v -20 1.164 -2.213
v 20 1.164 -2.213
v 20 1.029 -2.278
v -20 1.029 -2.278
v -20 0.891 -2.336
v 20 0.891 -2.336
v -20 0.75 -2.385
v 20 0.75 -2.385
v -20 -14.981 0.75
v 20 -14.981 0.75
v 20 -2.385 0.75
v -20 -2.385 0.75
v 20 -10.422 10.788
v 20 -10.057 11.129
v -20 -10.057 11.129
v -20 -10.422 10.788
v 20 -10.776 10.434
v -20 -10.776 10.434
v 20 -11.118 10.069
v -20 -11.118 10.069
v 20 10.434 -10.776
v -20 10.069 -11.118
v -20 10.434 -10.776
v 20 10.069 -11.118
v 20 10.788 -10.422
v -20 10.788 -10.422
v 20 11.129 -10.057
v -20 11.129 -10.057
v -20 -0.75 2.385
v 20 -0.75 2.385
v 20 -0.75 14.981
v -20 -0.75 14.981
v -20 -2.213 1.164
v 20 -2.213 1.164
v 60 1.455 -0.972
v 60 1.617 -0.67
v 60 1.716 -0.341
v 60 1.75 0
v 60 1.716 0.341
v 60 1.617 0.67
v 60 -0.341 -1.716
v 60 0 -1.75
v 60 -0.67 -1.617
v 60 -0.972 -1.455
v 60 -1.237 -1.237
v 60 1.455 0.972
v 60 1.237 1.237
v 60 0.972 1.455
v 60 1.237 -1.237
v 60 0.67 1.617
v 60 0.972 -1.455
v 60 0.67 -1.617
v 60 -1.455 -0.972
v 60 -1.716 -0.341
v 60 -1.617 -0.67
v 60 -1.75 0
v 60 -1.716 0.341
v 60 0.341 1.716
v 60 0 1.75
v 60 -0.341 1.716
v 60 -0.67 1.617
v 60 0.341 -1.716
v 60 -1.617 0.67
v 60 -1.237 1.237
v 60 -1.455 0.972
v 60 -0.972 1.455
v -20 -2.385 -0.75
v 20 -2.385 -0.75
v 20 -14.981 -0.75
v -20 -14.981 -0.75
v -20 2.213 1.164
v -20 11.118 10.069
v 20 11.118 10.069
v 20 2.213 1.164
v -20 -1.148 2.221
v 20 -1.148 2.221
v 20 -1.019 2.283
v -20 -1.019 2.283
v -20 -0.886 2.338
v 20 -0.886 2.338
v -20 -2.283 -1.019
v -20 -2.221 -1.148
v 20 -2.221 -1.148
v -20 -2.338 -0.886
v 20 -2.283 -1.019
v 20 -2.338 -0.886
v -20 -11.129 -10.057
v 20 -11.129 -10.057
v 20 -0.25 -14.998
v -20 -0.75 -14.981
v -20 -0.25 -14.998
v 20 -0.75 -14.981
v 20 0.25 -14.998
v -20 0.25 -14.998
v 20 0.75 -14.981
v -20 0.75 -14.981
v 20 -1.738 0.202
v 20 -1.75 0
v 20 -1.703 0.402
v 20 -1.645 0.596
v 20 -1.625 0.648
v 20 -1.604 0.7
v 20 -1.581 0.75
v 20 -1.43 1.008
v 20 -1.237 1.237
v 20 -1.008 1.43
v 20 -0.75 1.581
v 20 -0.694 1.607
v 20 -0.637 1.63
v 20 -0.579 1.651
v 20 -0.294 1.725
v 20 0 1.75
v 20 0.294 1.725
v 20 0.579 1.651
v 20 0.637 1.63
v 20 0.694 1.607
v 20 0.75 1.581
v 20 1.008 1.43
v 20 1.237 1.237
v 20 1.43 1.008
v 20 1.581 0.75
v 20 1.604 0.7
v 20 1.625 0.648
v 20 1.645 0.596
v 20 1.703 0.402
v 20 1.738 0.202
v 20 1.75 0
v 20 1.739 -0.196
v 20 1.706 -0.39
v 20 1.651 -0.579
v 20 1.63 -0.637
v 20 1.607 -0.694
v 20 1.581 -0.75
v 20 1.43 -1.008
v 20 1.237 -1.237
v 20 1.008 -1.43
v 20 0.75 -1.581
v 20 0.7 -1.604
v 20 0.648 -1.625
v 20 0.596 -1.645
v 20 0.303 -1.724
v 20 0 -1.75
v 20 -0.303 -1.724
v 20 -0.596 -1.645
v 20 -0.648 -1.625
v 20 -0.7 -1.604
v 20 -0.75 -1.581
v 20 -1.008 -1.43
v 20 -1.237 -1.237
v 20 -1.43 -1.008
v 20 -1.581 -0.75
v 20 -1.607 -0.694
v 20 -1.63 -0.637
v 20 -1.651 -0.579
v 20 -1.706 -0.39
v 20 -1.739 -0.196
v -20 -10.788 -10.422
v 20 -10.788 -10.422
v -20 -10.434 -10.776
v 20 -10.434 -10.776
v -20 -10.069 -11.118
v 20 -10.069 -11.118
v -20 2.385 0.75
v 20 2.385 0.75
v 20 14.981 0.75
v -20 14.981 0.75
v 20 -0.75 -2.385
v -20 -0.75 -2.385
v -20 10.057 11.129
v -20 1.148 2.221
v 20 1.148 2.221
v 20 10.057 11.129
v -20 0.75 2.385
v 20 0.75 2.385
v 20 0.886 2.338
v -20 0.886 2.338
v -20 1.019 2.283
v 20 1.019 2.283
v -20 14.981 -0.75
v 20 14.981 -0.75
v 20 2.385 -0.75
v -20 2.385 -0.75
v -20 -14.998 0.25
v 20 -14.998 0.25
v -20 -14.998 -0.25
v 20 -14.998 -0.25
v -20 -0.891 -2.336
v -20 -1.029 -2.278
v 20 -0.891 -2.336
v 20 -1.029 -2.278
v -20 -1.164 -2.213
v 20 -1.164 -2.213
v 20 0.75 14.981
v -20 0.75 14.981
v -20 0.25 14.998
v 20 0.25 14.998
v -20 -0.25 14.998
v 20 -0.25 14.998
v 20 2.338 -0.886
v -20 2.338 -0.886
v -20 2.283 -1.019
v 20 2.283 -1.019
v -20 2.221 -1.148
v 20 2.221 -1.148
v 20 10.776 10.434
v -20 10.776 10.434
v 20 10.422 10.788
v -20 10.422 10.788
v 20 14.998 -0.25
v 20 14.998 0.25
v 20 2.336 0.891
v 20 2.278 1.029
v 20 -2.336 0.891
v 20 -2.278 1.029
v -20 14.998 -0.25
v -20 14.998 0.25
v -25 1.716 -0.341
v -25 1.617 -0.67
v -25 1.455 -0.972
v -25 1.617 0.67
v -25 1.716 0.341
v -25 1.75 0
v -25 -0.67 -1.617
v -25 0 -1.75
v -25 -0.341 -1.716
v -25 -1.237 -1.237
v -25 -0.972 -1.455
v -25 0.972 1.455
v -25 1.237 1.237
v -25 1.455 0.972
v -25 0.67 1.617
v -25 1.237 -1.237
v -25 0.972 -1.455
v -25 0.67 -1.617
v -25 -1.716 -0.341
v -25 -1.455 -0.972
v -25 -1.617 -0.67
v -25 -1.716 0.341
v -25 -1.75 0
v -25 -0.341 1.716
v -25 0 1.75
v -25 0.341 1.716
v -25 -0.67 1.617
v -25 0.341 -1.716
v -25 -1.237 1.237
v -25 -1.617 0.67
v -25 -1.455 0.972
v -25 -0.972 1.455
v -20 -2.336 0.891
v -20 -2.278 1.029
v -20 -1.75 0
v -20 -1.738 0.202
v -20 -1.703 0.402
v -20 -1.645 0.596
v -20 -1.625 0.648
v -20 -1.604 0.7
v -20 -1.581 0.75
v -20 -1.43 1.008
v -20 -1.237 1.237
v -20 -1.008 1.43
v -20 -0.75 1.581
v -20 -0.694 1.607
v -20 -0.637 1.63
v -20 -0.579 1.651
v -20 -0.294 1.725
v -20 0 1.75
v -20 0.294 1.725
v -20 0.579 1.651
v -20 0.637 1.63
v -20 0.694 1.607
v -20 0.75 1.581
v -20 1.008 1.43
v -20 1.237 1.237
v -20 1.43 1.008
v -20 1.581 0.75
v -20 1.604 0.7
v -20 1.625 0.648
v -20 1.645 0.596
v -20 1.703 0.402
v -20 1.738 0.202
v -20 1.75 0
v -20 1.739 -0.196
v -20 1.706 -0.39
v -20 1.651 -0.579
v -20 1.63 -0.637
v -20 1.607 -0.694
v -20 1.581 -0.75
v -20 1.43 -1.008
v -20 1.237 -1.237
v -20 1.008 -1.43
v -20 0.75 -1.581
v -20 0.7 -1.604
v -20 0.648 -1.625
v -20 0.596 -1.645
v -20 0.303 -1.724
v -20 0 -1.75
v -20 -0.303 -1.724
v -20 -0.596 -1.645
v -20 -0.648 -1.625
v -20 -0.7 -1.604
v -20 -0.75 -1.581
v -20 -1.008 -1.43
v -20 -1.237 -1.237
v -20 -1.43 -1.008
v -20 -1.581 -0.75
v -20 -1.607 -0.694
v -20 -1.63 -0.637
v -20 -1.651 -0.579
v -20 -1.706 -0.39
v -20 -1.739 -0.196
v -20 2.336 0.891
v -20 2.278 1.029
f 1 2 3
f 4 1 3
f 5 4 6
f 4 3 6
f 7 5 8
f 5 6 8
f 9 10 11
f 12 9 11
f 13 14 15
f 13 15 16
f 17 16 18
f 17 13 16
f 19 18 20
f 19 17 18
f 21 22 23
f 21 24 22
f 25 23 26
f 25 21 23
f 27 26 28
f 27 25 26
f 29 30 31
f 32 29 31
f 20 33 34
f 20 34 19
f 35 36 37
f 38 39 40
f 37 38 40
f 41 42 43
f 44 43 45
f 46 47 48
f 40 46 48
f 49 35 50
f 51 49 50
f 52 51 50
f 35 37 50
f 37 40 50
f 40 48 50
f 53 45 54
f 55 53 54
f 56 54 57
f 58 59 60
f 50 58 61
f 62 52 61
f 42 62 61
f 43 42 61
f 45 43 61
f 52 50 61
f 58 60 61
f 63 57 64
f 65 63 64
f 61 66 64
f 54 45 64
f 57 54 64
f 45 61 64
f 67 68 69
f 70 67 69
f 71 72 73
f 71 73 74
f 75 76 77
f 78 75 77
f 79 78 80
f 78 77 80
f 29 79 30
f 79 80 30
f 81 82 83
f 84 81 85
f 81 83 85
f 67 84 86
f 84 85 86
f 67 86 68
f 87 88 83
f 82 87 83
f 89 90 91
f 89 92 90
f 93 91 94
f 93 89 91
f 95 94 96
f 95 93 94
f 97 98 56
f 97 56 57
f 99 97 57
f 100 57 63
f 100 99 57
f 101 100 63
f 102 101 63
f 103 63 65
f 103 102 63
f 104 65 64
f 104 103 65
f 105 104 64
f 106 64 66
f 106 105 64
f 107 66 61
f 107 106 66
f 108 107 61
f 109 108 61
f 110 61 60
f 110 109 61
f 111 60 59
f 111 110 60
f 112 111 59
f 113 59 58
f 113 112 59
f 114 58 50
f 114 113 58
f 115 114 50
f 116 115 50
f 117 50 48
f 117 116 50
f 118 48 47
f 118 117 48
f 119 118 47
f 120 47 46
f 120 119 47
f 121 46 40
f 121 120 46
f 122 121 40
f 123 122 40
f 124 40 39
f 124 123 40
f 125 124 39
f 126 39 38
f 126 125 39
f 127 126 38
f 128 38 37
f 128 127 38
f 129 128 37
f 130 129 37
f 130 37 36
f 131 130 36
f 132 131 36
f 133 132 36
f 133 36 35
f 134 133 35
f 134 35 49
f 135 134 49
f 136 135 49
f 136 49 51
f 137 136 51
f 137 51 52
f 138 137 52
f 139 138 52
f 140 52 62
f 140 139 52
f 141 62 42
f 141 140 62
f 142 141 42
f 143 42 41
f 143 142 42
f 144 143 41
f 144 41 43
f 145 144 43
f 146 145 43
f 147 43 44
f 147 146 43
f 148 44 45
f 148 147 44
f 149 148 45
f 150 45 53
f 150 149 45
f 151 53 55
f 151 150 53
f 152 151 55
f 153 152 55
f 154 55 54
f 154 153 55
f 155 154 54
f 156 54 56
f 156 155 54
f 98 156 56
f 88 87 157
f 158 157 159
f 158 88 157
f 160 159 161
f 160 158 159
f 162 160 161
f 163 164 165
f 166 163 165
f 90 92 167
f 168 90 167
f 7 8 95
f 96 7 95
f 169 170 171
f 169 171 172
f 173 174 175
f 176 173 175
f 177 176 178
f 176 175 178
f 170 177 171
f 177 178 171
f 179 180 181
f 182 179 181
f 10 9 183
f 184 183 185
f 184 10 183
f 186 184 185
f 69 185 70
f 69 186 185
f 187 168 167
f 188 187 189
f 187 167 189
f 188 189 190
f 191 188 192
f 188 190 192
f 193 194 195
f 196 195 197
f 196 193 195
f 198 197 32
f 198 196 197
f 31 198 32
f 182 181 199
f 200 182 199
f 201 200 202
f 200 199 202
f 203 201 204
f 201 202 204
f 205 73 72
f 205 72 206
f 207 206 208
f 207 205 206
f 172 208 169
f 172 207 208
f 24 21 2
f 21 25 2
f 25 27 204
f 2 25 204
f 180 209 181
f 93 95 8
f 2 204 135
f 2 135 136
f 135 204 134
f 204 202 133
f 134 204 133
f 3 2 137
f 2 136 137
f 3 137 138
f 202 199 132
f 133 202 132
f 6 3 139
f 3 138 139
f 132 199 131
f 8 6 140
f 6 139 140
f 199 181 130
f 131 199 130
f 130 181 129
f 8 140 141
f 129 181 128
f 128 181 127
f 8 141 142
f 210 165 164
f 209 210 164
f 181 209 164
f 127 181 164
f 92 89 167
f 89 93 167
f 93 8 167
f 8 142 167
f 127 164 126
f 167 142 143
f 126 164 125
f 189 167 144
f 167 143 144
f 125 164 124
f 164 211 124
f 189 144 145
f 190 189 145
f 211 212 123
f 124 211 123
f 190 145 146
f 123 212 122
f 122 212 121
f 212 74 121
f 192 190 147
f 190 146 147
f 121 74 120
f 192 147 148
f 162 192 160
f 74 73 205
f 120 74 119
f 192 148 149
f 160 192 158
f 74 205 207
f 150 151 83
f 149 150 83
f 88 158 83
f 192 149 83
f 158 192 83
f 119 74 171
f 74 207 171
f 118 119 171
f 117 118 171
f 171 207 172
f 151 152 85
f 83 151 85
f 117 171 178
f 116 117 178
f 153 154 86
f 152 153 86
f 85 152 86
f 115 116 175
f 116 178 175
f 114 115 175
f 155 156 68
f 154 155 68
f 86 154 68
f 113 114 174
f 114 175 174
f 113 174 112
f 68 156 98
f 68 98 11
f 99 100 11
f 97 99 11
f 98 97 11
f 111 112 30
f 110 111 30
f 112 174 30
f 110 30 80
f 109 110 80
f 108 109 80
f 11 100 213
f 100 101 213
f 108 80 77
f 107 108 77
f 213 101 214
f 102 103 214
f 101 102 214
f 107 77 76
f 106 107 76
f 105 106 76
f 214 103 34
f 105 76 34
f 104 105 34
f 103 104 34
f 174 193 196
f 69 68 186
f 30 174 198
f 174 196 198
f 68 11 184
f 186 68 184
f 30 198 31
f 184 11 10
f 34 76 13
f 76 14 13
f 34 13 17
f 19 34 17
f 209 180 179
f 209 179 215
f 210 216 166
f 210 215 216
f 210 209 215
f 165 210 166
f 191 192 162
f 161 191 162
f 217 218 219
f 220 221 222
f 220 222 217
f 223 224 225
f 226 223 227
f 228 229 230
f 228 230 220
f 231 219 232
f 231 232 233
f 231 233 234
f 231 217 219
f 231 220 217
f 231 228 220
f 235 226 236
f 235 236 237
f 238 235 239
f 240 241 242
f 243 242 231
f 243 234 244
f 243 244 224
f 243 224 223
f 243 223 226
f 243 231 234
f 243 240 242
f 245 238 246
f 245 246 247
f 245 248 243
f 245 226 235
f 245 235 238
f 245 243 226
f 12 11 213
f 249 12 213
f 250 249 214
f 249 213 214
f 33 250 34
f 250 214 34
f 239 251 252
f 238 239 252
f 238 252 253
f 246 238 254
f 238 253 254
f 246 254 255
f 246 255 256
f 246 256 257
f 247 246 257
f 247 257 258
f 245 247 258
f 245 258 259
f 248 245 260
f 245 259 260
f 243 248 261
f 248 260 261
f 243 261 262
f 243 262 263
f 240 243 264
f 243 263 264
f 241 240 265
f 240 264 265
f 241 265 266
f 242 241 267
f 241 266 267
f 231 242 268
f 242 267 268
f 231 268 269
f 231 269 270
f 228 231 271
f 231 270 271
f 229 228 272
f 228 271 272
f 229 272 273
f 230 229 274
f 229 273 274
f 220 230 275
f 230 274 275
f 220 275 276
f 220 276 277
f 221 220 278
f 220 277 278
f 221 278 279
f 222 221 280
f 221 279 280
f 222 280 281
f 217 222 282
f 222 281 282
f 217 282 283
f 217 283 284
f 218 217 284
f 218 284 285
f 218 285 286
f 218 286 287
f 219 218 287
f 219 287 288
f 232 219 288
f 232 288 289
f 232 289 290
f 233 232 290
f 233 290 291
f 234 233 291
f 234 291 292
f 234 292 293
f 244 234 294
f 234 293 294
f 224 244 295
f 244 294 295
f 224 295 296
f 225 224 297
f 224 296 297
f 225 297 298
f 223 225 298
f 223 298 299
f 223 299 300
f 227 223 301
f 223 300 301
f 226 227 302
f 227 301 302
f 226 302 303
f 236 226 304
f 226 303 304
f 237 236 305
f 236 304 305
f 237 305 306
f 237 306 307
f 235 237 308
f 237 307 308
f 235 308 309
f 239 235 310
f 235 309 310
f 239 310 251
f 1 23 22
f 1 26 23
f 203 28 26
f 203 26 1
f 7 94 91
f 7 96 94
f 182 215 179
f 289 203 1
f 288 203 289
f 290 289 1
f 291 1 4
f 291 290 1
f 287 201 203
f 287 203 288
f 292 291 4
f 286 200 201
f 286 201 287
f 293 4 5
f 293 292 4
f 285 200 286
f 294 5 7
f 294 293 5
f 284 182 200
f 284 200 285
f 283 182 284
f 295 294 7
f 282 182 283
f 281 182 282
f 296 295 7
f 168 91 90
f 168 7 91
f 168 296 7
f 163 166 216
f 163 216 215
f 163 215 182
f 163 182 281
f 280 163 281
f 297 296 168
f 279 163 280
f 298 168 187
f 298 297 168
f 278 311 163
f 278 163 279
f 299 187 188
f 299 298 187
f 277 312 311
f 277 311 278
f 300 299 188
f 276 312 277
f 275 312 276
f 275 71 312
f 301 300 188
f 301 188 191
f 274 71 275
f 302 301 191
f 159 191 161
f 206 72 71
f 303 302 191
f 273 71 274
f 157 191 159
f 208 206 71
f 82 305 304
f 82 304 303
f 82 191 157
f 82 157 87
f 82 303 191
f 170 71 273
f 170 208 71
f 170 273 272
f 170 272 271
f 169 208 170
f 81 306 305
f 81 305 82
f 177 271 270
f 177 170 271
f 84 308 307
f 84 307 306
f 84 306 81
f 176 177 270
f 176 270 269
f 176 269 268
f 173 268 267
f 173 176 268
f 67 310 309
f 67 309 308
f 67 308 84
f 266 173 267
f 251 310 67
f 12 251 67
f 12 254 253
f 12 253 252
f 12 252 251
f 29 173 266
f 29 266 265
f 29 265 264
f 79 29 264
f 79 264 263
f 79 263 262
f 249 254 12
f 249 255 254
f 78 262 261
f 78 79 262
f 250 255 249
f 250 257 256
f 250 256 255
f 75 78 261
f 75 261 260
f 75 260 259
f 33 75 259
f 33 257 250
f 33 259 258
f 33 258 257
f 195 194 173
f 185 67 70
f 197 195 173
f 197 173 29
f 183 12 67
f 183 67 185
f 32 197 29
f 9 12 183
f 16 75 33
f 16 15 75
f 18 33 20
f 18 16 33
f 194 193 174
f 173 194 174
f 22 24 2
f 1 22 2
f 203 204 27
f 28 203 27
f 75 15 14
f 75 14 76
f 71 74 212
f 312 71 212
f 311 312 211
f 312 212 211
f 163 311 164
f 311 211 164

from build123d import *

# Parameters (mm, degrees)
F0_W          = 40
F0_H          = 15
F3_DEPTH      = 40.001
F4_R          = 1.75
F4_R_2        = 0.75
F6_DEPTH      = 5
F6_DEPTH_BACK = 80


with BuildPart() as f1:
    # F0 (on Top) → F1 (revolve)
    with BuildSketch(Plane.XY):
        with Locations((0, 7.5)):
            Rectangle(F0_W, F0_H)
    revolve(axis=Axis((0, 0, 0), (1, 0, 0)))

    # F2 (on face) → F3 (cut, through all)
    with BuildSketch(Plane.YZ.offset(20)):
        with BuildLine():
            ThreePointArc((1.651475323, -0.578903496), (1.7251930059, -0.2936138491), (1.75, 0))
            ThreePointArc((1.75, 0), (1.7236043316, 0.3028004429), (1.6452135906, 0.5964664628))
            ThreePointArc((1.6452135906, 0.5964664628), (1.6150017407, 0.6739950872), (1.5811388301, 0.75))
            ThreePointArc((1.5811388301, 0.75), (1.2374368671, 1.2374368671), (0.75, 1.5811388301))
            ThreePointArc((0.75, 1.5811388301), (0.6653812907, 1.618569658), (0.5789024703, 1.6514756825))
            ThreePointArc((0.5789024703, 1.6514756825), (0, 1.75), (-0.5789024703, 1.6514756825))
            ThreePointArc((-0.5789024703, 1.6514756825), (-0.6653812907, 1.618569658), (-0.75, 1.5811388301))
            ThreePointArc((-0.75, 1.5811388301), (-1.2374368671, 1.2374368671), (-1.5811388301, 0.75))
            ThreePointArc((-1.5811388301, 0.75), (-1.6150017407, 0.6739950872), (-1.6452135906, 0.5964664628))
            ThreePointArc((-1.6452135906, 0.5964664628), (-1.7499751665, 0.0093229166), (-1.651475323, -0.578903496))
            ThreePointArc((-1.651475323, -0.578903496), (-1.6185694514, -0.6653817934), (-1.5811388301, -0.75))
            ThreePointArc((-1.5811388301, -0.75), (-1.2374368671, -1.2374368671), (-0.75, -1.5811388301))
            ThreePointArc((-0.75, -1.5811388301), (-0.6739945857, -1.61500195), (-0.596465441, -1.6452139611))
            ThreePointArc((-0.596465441, -1.6452139611), (0, -1.75), (0.596465441, -1.6452139611))
            ThreePointArc((0.596465441, -1.6452139611), (0.6739945857, -1.61500195), (0.75, -1.5811388301))
            ThreePointArc((0.75, -1.5811388301), (1.2374368671, -1.2374368671), (1.5811388301, -0.75))
            ThreePointArc((1.5811388301, -0.75), (1.6185694514, -0.6653817934), (1.651475323, -0.578903496))
        make_face()
        with BuildLine():
            ThreePointArc((2.2125773299, 1.1638305544), (2.3080064679, 0.9607841298), (2.3848480035, 0.75))
            Line((2.3848480035, 0.75), (14.9812382666, 0.75))
            ThreePointArc((14.9812382666, 0.75), (13.8565778233, 5.7441492866), (11.118002457, 10.0692612126))
            Line((11.118002457, 10.0692612126), (2.2125773299, 1.1638305544))
        make_face()
        with BuildLine():
            ThreePointArc((2.3848480035, -0.75), (2.3113855708, -0.9526262348), (2.2207433968, -1.1481719234))
            Line((2.2207433968, -1.1481719234), (11.1293184453, -10.0567525048))
            ThreePointArc((11.1293184453, -10.0567525048), (13.8598053196, -5.7363574246), (14.9812382666, -0.75))
            Line((14.9812382666, -0.75), (2.3848480035, -0.75))
        make_face()
        with BuildLine():
            Line((10.0692543074, -11.1180087108), (1.1638291802, -2.2125780527))
            ThreePointArc((1.1638291802, -2.2125780527), (0.960783413, -2.3080067663), (0.75, -2.3848480035))
            Line((0.75, -2.3848480035), (0.75, -14.9812382666))
            ThreePointArc((0.75, -14.9812382666), (5.7441449835, -13.8565796071), (10.0692543074, -11.1180087108))
        make_face()
        with BuildLine():
            Line((-0.75, -14.9812382666), (-0.75, -2.3848480035))
            ThreePointArc((-0.75, -2.3848480035), (-0.960783413, -2.3080067663), (-1.1638291802, -2.2125780527))
            Line((-1.1638291802, -2.2125780527), (-10.0692543074, -11.1180087108))
            ThreePointArc((-10.0692543074, -11.1180087108), (-5.7441449835, -13.8565796071), (-0.75, -14.9812382666))
        make_face()
        with BuildLine():
            Line((-11.1293184453, -10.0567525048), (-2.2207433968, -1.1481719234))
            ThreePointArc((-2.2207433968, -1.1481719234), (-2.3113855708, -0.9526262348), (-2.3848480035, -0.75))
            Line((-2.3848480035, -0.75), (-14.9812382666, -0.75))
            ThreePointArc((-14.9812382666, -0.75), (-13.8598053196, -5.7363574246), (-11.1293184453, -10.0567525048))
        make_face()
        with BuildLine():
            ThreePointArc((-2.3848480035, 0.75), (-2.3080064679, 0.9607841298), (-2.2125773299, 1.1638305544))
            Line((-2.2125773299, 1.1638305544), (-11.118002457, 10.0692612126))
            ThreePointArc((-11.118002457, 10.0692612126), (-13.8565778233, 5.7441492866), (-14.9812382666, 0.75))
            Line((-14.9812382666, 0.75), (-2.3848480035, 0.75))
        make_face()
        with BuildLine():
            ThreePointArc((-1.1481705441, 2.2207441099), (-0.952625517, 2.3113858666), (-0.75, 2.3848480035))
            Line((-0.75, 2.3848480035), (-0.75, 14.9812382666))
            ThreePointArc((-0.75, 14.9812382666), (-5.7363531205, 13.859807101), (-10.0567455926, 11.1293246914))
            Line((-10.0567455926, 11.1293246914), (-1.1481705441, 2.2207441099))
        make_face()
        with BuildLine():
            ThreePointArc((0.75, 2.3848480035), (0.952625517, 2.3113858666), (1.1481705441, 2.2207441099))
            Line((1.1481705441, 2.2207441099), (10.0567455926, 11.1293246914))
            ThreePointArc((10.0567455926, 11.1293246914), (5.7363531205, 13.859807101), (0.75, 14.9812382666))
            Line((0.75, 14.9812382666), (0.75, 2.3848480035))
        make_face()
    extrude(amount=-F3_DEPTH, mode=Mode.SUBTRACT)

    # F4 (on face) → F6 (join, two sides)
    with BuildSketch(Plane(origin=(-20, 0, 0), x_dir=(0, -1, 0), z_dir=(-1, 0, 0))) as f6_sk:
        Circle(F4_R)
        Circle(F4_R_2, mode=Mode.SUBTRACT)
        Circle(F4_R_2)
    extrude(amount=F6_DEPTH)
    extrude(f6_sk.sketch, amount=-F6_DEPTH_BACK)


solid = f1.part
